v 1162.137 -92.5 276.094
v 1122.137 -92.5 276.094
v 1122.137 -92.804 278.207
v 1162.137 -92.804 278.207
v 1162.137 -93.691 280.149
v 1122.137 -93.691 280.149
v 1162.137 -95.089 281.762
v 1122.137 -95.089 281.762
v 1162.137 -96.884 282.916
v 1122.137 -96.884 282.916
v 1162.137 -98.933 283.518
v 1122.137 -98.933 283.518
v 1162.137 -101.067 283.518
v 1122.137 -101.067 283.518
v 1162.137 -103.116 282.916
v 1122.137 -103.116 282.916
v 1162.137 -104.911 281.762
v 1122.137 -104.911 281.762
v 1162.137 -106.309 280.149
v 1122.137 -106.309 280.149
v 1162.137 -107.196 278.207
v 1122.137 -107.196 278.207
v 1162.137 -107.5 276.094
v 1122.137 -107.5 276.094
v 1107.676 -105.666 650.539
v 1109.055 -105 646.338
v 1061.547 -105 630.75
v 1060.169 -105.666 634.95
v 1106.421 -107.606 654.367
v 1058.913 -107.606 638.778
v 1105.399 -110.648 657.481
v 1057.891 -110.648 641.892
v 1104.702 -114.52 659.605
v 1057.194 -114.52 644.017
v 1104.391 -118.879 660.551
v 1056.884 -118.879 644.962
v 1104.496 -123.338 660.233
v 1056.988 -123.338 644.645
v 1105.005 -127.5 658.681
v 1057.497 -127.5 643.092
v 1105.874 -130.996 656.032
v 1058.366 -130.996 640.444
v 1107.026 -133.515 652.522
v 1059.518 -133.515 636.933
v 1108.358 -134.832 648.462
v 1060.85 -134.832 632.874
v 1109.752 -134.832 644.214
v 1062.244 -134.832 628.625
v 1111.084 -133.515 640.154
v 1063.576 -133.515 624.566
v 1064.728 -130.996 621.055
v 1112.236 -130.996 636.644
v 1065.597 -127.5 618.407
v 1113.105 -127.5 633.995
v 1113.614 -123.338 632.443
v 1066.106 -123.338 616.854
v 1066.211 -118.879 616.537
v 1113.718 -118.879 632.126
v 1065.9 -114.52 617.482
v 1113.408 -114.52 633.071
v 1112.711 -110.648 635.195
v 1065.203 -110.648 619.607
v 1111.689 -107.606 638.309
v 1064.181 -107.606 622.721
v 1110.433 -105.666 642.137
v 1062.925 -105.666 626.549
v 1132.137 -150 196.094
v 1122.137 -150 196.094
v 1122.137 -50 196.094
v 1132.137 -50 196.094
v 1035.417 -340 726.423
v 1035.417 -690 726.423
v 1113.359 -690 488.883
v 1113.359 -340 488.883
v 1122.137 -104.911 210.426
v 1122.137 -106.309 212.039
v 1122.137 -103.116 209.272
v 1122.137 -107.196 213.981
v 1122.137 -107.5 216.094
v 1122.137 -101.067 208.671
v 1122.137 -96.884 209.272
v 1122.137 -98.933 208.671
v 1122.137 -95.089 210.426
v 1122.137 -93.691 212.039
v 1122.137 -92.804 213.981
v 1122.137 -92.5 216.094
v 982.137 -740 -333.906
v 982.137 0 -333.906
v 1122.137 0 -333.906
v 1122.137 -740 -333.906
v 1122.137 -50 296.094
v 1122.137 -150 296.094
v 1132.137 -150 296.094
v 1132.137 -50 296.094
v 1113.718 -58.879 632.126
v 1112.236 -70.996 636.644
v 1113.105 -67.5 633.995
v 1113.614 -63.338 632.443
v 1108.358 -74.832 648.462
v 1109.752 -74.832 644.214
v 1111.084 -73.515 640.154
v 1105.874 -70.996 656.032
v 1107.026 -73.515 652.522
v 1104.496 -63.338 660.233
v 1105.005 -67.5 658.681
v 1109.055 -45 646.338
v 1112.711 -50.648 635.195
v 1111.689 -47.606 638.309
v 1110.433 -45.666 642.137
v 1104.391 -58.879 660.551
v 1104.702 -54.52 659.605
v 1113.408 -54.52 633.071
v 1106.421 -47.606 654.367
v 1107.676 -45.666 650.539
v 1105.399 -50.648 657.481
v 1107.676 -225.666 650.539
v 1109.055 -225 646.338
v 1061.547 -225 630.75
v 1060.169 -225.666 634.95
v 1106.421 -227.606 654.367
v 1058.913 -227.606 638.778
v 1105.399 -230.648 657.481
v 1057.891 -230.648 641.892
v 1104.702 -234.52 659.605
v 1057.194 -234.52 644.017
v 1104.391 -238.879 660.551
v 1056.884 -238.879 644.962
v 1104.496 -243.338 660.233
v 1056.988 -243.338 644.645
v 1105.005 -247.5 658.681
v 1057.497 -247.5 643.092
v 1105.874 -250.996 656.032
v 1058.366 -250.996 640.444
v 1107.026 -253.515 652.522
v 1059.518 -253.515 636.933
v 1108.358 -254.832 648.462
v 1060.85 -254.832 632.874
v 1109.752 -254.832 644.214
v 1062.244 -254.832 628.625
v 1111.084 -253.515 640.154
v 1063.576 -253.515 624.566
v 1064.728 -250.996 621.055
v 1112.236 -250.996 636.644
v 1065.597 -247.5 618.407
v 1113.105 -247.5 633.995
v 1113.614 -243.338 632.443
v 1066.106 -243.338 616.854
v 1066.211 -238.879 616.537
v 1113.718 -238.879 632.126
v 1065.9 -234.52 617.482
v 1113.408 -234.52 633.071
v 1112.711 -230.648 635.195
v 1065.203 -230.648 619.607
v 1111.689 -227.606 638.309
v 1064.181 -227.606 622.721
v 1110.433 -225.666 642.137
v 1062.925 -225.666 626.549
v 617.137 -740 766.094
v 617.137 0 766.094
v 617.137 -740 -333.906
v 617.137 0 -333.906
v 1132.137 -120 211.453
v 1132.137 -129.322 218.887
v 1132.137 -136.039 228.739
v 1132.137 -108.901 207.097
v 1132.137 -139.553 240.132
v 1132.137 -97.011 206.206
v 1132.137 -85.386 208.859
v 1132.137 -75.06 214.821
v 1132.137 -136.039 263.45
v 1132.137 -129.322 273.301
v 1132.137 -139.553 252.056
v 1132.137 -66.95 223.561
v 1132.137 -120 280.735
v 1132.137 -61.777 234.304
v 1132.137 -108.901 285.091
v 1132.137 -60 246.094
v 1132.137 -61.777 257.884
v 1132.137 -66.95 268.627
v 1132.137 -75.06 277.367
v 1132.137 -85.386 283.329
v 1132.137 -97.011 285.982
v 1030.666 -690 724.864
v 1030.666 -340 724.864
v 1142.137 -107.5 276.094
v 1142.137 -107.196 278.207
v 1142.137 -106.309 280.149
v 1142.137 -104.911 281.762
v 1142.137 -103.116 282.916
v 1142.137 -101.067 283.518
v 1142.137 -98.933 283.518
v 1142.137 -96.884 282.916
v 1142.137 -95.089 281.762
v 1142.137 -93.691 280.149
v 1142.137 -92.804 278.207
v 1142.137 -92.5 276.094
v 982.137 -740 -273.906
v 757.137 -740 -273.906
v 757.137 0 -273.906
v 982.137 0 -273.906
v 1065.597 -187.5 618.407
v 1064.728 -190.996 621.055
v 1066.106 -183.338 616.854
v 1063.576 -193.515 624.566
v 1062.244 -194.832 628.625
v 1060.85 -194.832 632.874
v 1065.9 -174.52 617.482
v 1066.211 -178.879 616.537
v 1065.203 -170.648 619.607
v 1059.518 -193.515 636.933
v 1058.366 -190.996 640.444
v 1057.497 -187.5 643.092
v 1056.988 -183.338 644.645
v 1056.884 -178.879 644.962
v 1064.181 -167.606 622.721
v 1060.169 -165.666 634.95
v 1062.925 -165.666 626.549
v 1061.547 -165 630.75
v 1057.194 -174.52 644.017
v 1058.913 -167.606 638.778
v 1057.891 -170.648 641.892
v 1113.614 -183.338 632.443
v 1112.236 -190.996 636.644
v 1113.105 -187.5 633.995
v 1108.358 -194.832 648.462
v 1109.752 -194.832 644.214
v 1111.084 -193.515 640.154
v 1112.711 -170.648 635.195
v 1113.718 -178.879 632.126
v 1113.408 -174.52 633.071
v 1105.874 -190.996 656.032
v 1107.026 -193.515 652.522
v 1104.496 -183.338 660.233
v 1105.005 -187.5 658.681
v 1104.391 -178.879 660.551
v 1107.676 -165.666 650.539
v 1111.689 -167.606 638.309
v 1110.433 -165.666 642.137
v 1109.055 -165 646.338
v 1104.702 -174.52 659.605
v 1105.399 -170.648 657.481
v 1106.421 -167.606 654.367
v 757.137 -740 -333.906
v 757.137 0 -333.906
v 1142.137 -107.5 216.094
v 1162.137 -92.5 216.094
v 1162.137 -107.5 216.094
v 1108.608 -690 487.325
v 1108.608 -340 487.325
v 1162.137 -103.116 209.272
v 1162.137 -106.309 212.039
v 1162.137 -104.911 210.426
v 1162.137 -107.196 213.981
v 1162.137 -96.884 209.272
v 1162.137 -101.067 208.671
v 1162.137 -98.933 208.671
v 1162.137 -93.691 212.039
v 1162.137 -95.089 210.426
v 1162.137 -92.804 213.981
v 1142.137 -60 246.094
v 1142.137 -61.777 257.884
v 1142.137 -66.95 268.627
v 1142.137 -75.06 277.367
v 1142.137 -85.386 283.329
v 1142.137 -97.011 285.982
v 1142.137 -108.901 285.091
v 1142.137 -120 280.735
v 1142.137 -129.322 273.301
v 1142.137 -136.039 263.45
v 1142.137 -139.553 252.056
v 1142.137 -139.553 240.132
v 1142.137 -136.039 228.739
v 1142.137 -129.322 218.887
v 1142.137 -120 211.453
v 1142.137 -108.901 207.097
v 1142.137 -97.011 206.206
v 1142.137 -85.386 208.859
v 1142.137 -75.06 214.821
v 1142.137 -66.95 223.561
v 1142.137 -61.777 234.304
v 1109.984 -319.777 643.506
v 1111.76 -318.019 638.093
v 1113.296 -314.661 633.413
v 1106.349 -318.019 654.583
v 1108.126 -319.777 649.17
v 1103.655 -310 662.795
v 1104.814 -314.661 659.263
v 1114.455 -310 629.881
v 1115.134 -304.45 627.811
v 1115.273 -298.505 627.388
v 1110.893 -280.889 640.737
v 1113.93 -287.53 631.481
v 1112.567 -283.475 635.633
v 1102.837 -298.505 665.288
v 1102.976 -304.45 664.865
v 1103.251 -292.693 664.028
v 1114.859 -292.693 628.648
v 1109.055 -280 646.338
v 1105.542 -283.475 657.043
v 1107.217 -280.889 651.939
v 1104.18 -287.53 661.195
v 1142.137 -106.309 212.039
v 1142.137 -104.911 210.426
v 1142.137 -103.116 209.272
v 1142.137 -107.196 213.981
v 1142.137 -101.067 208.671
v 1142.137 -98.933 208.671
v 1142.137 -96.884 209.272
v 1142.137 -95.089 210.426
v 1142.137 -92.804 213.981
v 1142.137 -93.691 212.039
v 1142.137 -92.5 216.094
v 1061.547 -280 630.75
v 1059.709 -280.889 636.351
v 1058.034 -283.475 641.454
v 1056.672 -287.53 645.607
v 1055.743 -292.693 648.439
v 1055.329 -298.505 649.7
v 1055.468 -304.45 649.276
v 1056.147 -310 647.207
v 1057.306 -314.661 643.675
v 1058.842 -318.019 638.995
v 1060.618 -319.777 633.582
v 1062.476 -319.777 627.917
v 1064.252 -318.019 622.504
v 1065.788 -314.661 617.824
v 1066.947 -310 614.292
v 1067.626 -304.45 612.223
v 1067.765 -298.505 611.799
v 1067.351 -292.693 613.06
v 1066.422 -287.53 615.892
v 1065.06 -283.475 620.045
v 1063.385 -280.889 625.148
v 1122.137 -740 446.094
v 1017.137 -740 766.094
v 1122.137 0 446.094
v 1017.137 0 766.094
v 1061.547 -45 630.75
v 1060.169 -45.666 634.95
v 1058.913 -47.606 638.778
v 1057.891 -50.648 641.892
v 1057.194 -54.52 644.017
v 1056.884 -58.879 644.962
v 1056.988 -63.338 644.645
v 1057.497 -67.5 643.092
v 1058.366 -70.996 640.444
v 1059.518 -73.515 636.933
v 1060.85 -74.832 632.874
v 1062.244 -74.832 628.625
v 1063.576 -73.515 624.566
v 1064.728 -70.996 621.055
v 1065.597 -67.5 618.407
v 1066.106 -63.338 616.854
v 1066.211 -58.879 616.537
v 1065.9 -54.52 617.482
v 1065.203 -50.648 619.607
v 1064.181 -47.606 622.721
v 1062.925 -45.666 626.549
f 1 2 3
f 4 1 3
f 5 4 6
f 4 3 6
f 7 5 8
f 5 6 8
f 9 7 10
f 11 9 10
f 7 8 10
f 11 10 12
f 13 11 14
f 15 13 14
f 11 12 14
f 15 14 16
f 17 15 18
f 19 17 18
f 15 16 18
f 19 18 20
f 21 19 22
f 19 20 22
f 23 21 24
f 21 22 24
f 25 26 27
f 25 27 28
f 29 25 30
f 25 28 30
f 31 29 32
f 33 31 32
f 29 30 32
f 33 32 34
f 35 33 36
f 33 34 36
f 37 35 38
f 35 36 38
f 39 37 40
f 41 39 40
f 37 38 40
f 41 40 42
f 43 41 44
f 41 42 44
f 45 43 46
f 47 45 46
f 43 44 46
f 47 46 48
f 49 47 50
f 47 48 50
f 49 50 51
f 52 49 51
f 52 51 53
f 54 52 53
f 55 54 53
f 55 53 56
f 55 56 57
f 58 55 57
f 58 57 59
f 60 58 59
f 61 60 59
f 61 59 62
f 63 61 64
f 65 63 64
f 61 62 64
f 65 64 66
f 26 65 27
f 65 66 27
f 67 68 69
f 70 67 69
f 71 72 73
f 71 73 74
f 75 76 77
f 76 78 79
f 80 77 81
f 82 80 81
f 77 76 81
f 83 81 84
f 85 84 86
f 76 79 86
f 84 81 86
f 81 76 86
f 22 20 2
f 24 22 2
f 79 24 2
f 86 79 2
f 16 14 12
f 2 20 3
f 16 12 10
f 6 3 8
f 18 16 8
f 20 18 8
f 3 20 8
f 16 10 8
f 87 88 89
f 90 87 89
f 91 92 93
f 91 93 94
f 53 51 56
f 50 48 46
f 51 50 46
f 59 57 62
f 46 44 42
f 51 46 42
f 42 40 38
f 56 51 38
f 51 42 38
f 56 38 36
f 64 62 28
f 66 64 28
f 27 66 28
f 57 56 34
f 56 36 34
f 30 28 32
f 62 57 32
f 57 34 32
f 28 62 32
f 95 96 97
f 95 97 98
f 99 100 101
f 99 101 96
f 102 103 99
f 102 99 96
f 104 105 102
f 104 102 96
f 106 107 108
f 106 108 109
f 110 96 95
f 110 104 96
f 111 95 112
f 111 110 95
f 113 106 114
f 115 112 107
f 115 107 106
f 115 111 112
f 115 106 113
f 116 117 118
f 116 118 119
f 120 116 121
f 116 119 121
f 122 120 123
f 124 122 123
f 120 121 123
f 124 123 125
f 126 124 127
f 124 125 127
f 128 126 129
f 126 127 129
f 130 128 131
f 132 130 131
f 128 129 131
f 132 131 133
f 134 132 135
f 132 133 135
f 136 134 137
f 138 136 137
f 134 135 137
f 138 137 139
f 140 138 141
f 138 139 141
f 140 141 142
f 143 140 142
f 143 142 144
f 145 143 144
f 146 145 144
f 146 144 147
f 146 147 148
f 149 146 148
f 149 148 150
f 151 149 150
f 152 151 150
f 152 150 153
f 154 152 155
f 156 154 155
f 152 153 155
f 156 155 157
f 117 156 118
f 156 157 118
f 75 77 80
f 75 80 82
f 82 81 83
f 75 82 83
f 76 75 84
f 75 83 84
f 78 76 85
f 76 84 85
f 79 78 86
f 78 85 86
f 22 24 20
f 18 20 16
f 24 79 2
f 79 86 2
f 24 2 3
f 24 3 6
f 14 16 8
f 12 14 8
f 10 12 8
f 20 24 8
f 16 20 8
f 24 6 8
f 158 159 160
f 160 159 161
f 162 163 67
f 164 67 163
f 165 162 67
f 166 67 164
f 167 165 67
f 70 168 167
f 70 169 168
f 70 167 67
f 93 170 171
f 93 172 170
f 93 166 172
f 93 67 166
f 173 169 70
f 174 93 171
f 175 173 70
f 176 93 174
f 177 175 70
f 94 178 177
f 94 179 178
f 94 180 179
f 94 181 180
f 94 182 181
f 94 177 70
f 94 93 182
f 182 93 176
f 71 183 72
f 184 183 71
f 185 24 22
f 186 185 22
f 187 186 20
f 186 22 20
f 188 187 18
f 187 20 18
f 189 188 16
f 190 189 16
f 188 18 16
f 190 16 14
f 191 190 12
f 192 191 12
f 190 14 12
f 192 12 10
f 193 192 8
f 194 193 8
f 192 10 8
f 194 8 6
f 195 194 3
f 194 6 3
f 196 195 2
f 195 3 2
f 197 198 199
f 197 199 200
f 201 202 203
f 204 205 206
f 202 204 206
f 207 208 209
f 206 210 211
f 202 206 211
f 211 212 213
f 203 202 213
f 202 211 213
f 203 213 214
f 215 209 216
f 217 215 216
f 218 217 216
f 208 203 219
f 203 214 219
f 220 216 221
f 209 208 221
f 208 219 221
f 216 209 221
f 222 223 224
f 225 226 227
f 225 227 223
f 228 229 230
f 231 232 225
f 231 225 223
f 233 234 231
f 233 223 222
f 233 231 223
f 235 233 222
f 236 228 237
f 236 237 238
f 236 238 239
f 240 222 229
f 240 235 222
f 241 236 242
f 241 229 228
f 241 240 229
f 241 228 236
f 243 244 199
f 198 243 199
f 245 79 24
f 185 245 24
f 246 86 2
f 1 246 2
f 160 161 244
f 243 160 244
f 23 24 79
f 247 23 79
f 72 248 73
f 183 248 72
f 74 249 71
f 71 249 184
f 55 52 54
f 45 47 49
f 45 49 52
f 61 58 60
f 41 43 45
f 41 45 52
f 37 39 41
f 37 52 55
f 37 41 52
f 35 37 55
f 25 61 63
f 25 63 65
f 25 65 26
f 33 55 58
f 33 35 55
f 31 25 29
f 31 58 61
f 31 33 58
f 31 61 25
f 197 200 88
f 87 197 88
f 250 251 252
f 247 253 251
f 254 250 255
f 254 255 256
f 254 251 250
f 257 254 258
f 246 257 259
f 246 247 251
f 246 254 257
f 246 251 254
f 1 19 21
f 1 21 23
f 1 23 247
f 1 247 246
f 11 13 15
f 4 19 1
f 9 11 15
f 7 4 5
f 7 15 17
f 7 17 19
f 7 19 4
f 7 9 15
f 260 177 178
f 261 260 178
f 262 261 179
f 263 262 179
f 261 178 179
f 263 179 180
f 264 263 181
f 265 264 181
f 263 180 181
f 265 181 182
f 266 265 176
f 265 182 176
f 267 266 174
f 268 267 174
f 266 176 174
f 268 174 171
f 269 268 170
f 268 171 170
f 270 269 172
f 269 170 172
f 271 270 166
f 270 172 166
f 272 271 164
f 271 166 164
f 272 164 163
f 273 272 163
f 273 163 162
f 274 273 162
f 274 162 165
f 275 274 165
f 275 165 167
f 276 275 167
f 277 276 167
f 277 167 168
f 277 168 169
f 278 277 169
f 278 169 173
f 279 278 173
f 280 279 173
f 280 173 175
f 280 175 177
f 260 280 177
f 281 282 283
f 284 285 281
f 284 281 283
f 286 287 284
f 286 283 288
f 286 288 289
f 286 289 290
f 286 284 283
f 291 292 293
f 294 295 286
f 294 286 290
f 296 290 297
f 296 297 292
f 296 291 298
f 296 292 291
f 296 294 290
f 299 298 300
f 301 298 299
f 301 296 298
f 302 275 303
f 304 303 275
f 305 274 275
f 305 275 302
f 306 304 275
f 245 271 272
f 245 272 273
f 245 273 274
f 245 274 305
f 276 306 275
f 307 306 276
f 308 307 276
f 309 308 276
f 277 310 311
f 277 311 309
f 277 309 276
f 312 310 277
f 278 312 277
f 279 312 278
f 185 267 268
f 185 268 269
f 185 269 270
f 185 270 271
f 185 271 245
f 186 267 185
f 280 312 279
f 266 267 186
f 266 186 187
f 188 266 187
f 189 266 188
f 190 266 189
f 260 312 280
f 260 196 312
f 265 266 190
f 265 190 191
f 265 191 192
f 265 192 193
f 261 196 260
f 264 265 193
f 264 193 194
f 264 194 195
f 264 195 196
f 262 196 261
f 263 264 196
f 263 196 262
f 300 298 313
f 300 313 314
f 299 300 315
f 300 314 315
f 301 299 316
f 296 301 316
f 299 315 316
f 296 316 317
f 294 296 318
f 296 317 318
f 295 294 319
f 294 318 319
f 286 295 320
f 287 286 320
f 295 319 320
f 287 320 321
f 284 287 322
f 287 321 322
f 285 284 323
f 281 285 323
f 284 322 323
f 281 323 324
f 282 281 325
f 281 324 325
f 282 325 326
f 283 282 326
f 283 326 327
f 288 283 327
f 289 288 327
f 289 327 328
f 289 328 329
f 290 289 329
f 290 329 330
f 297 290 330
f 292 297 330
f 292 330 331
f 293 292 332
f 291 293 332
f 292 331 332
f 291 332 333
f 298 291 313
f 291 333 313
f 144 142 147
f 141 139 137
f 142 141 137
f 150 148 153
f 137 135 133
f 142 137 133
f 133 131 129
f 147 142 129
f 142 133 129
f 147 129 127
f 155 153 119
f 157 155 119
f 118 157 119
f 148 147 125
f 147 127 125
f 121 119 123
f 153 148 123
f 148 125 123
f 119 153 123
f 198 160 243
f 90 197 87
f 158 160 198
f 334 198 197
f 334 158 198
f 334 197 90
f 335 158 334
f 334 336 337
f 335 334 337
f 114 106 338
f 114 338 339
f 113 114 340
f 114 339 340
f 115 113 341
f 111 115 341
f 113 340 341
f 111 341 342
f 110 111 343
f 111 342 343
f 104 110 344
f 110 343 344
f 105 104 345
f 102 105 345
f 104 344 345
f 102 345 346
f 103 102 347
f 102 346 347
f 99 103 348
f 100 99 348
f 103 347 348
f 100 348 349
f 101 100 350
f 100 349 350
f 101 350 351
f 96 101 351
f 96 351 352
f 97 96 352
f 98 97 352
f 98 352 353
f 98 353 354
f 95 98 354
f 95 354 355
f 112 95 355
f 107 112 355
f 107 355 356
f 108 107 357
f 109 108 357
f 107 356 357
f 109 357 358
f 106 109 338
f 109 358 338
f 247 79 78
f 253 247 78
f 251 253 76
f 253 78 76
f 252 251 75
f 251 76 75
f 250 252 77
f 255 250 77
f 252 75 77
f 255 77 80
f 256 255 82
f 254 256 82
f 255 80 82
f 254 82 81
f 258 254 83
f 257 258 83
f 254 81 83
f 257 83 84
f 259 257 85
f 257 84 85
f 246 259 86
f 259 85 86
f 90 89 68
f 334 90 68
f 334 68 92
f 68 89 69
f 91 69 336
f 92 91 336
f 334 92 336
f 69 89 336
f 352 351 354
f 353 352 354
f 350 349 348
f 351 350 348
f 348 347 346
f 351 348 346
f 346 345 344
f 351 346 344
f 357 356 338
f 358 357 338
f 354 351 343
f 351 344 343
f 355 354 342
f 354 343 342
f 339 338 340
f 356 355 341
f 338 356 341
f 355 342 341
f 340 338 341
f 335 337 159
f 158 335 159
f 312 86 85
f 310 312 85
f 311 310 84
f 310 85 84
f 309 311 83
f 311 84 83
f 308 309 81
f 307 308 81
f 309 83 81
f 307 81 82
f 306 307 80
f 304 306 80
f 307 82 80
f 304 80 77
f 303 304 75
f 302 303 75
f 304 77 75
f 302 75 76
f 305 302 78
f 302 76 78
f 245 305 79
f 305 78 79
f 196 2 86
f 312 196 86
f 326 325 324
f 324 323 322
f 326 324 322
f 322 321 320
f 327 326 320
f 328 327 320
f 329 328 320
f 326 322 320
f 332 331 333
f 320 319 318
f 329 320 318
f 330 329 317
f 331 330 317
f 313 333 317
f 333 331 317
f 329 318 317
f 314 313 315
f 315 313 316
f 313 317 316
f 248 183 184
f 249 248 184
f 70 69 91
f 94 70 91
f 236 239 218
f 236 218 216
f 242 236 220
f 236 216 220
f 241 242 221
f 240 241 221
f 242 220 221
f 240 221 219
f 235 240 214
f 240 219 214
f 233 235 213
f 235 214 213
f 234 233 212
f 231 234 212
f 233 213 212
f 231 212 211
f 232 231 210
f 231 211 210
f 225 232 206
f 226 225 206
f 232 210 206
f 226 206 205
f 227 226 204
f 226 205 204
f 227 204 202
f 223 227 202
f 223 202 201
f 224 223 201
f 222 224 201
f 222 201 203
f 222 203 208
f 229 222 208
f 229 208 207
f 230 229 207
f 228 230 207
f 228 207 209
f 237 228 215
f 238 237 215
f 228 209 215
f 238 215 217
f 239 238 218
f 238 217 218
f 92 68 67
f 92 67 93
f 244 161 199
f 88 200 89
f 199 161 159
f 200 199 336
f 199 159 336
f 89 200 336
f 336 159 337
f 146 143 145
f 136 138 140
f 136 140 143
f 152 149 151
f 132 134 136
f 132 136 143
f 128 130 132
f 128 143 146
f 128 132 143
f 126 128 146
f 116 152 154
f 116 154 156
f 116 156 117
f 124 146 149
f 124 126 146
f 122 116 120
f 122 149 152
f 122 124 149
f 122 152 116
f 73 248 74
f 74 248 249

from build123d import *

# Parameters (mm, degrees)
F1_DEPTH = 740
F2_W     = 100
F2_H     = 100
F2_R     = 40
F3_DEPTH = 10
F4_DEPTH = 20
F5_DEPTH = 40
F6_W     = 350
F6_H     = 250
F7_DEPTH = 5
F8_R     = 20
F8_R_2   = 15
F9_DEPTH = 50


with BuildPart() as f1:
    # F0 (on Front) → F1 (new body)
    with BuildSketch(Plane.XZ):
        Polygon((1017.13698, 766.094184), (617.13698, 766.094184), (617.13698, -333.905816), (757.13698, -333.905816), (757.13698, -273.905816), (982.13698, -273.905816), (982.13698, -333.905816), (1122.13698, -333.905816), (1122.13698, 446.094184), align=None)
    extrude(amount=F1_DEPTH)

    # F2 (on face) → F3 (join)
    with BuildSketch(Plane.YZ.offset(1122.13698)):
        with Locations((-100, 246.094184)):
            Rectangle(F2_W, F2_H)
        with Locations((-100, 246.094184)):
            Circle(F2_R, mode=Mode.SUBTRACT)
    extrude(amount=F3_DEPTH)

    # F2 (on face) → F4 (join)
    with BuildSketch(Plane.YZ.offset(1122.13698)):
        with Locations((-100, 246.094184)):
            Circle(F2_R)
        with BuildLine():
            Line((-107.5, 216.094184), (-107.5, 276.094184))
            ThreePointArc((-107.5, 276.094184), (-100, 283.594184), (-92.5, 276.094184))
            Line((-92.5, 276.094184), (-92.5, 216.094184))
            ThreePointArc((-92.5, 216.094184), (-100, 208.594184), (-107.5, 216.094184))
        make_face(mode=Mode.SUBTRACT)
    extrude(amount=F4_DEPTH)


with BuildPart() as f5:
    # F2 (on face) → F5 (new body)
    with BuildSketch(Plane.YZ.offset(1122.13698)):
        with BuildLine():
            ThreePointArc((-92.5, 276.094184), (-100, 283.594184), (-107.5, 276.094184))
            Line((-107.5, 276.094184), (-107.5, 216.094184))
            ThreePointArc((-107.5, 216.094184), (-100, 208.594184), (-92.5, 216.094184))
            Line((-92.5, 216.094184), (-92.5, 276.094184))
        make_face()
    extrude(amount=F5_DEPTH)


with BuildPart() as f7:
    # F6 (on face) → F7 (new body)
    with BuildSketch(Plane(origin=(1145.211297, 0, 375.772457), x_dir=(0, 1, 0), z_dir=(0.950157, 0, 0.31177))):
        with Locations((-515, 242.403745)):
            Rectangle(F6_W, F6_H)
    extrude(amount=F7_DEPTH)


with BuildPart() as f9:
    # F8 (on face) → F9 (new body)
    with BuildSketch(Plane(origin=(1145.211297, 0, 375.772457), x_dir=(0, 1, 0), z_dir=(0.950157, 0, 0.31177))):
        with Locations((-300, 268.352389)):
            Circle(F8_R)
        with Locations((-240, 268.352389)):
            Circle(F8_R_2)
        with Locations((-180, 268.352389)):
            Circle(F8_R_2)
        with Locations((-120, 268.352389)):
            Circle(F8_R_2)
        with Locations((-60, 268.352389)):
            Circle(F8_R_2)
    extrude(amount=F9_DEPTH)


solid = Compound([f1.part, f5.part, f7.part, f9.part])
